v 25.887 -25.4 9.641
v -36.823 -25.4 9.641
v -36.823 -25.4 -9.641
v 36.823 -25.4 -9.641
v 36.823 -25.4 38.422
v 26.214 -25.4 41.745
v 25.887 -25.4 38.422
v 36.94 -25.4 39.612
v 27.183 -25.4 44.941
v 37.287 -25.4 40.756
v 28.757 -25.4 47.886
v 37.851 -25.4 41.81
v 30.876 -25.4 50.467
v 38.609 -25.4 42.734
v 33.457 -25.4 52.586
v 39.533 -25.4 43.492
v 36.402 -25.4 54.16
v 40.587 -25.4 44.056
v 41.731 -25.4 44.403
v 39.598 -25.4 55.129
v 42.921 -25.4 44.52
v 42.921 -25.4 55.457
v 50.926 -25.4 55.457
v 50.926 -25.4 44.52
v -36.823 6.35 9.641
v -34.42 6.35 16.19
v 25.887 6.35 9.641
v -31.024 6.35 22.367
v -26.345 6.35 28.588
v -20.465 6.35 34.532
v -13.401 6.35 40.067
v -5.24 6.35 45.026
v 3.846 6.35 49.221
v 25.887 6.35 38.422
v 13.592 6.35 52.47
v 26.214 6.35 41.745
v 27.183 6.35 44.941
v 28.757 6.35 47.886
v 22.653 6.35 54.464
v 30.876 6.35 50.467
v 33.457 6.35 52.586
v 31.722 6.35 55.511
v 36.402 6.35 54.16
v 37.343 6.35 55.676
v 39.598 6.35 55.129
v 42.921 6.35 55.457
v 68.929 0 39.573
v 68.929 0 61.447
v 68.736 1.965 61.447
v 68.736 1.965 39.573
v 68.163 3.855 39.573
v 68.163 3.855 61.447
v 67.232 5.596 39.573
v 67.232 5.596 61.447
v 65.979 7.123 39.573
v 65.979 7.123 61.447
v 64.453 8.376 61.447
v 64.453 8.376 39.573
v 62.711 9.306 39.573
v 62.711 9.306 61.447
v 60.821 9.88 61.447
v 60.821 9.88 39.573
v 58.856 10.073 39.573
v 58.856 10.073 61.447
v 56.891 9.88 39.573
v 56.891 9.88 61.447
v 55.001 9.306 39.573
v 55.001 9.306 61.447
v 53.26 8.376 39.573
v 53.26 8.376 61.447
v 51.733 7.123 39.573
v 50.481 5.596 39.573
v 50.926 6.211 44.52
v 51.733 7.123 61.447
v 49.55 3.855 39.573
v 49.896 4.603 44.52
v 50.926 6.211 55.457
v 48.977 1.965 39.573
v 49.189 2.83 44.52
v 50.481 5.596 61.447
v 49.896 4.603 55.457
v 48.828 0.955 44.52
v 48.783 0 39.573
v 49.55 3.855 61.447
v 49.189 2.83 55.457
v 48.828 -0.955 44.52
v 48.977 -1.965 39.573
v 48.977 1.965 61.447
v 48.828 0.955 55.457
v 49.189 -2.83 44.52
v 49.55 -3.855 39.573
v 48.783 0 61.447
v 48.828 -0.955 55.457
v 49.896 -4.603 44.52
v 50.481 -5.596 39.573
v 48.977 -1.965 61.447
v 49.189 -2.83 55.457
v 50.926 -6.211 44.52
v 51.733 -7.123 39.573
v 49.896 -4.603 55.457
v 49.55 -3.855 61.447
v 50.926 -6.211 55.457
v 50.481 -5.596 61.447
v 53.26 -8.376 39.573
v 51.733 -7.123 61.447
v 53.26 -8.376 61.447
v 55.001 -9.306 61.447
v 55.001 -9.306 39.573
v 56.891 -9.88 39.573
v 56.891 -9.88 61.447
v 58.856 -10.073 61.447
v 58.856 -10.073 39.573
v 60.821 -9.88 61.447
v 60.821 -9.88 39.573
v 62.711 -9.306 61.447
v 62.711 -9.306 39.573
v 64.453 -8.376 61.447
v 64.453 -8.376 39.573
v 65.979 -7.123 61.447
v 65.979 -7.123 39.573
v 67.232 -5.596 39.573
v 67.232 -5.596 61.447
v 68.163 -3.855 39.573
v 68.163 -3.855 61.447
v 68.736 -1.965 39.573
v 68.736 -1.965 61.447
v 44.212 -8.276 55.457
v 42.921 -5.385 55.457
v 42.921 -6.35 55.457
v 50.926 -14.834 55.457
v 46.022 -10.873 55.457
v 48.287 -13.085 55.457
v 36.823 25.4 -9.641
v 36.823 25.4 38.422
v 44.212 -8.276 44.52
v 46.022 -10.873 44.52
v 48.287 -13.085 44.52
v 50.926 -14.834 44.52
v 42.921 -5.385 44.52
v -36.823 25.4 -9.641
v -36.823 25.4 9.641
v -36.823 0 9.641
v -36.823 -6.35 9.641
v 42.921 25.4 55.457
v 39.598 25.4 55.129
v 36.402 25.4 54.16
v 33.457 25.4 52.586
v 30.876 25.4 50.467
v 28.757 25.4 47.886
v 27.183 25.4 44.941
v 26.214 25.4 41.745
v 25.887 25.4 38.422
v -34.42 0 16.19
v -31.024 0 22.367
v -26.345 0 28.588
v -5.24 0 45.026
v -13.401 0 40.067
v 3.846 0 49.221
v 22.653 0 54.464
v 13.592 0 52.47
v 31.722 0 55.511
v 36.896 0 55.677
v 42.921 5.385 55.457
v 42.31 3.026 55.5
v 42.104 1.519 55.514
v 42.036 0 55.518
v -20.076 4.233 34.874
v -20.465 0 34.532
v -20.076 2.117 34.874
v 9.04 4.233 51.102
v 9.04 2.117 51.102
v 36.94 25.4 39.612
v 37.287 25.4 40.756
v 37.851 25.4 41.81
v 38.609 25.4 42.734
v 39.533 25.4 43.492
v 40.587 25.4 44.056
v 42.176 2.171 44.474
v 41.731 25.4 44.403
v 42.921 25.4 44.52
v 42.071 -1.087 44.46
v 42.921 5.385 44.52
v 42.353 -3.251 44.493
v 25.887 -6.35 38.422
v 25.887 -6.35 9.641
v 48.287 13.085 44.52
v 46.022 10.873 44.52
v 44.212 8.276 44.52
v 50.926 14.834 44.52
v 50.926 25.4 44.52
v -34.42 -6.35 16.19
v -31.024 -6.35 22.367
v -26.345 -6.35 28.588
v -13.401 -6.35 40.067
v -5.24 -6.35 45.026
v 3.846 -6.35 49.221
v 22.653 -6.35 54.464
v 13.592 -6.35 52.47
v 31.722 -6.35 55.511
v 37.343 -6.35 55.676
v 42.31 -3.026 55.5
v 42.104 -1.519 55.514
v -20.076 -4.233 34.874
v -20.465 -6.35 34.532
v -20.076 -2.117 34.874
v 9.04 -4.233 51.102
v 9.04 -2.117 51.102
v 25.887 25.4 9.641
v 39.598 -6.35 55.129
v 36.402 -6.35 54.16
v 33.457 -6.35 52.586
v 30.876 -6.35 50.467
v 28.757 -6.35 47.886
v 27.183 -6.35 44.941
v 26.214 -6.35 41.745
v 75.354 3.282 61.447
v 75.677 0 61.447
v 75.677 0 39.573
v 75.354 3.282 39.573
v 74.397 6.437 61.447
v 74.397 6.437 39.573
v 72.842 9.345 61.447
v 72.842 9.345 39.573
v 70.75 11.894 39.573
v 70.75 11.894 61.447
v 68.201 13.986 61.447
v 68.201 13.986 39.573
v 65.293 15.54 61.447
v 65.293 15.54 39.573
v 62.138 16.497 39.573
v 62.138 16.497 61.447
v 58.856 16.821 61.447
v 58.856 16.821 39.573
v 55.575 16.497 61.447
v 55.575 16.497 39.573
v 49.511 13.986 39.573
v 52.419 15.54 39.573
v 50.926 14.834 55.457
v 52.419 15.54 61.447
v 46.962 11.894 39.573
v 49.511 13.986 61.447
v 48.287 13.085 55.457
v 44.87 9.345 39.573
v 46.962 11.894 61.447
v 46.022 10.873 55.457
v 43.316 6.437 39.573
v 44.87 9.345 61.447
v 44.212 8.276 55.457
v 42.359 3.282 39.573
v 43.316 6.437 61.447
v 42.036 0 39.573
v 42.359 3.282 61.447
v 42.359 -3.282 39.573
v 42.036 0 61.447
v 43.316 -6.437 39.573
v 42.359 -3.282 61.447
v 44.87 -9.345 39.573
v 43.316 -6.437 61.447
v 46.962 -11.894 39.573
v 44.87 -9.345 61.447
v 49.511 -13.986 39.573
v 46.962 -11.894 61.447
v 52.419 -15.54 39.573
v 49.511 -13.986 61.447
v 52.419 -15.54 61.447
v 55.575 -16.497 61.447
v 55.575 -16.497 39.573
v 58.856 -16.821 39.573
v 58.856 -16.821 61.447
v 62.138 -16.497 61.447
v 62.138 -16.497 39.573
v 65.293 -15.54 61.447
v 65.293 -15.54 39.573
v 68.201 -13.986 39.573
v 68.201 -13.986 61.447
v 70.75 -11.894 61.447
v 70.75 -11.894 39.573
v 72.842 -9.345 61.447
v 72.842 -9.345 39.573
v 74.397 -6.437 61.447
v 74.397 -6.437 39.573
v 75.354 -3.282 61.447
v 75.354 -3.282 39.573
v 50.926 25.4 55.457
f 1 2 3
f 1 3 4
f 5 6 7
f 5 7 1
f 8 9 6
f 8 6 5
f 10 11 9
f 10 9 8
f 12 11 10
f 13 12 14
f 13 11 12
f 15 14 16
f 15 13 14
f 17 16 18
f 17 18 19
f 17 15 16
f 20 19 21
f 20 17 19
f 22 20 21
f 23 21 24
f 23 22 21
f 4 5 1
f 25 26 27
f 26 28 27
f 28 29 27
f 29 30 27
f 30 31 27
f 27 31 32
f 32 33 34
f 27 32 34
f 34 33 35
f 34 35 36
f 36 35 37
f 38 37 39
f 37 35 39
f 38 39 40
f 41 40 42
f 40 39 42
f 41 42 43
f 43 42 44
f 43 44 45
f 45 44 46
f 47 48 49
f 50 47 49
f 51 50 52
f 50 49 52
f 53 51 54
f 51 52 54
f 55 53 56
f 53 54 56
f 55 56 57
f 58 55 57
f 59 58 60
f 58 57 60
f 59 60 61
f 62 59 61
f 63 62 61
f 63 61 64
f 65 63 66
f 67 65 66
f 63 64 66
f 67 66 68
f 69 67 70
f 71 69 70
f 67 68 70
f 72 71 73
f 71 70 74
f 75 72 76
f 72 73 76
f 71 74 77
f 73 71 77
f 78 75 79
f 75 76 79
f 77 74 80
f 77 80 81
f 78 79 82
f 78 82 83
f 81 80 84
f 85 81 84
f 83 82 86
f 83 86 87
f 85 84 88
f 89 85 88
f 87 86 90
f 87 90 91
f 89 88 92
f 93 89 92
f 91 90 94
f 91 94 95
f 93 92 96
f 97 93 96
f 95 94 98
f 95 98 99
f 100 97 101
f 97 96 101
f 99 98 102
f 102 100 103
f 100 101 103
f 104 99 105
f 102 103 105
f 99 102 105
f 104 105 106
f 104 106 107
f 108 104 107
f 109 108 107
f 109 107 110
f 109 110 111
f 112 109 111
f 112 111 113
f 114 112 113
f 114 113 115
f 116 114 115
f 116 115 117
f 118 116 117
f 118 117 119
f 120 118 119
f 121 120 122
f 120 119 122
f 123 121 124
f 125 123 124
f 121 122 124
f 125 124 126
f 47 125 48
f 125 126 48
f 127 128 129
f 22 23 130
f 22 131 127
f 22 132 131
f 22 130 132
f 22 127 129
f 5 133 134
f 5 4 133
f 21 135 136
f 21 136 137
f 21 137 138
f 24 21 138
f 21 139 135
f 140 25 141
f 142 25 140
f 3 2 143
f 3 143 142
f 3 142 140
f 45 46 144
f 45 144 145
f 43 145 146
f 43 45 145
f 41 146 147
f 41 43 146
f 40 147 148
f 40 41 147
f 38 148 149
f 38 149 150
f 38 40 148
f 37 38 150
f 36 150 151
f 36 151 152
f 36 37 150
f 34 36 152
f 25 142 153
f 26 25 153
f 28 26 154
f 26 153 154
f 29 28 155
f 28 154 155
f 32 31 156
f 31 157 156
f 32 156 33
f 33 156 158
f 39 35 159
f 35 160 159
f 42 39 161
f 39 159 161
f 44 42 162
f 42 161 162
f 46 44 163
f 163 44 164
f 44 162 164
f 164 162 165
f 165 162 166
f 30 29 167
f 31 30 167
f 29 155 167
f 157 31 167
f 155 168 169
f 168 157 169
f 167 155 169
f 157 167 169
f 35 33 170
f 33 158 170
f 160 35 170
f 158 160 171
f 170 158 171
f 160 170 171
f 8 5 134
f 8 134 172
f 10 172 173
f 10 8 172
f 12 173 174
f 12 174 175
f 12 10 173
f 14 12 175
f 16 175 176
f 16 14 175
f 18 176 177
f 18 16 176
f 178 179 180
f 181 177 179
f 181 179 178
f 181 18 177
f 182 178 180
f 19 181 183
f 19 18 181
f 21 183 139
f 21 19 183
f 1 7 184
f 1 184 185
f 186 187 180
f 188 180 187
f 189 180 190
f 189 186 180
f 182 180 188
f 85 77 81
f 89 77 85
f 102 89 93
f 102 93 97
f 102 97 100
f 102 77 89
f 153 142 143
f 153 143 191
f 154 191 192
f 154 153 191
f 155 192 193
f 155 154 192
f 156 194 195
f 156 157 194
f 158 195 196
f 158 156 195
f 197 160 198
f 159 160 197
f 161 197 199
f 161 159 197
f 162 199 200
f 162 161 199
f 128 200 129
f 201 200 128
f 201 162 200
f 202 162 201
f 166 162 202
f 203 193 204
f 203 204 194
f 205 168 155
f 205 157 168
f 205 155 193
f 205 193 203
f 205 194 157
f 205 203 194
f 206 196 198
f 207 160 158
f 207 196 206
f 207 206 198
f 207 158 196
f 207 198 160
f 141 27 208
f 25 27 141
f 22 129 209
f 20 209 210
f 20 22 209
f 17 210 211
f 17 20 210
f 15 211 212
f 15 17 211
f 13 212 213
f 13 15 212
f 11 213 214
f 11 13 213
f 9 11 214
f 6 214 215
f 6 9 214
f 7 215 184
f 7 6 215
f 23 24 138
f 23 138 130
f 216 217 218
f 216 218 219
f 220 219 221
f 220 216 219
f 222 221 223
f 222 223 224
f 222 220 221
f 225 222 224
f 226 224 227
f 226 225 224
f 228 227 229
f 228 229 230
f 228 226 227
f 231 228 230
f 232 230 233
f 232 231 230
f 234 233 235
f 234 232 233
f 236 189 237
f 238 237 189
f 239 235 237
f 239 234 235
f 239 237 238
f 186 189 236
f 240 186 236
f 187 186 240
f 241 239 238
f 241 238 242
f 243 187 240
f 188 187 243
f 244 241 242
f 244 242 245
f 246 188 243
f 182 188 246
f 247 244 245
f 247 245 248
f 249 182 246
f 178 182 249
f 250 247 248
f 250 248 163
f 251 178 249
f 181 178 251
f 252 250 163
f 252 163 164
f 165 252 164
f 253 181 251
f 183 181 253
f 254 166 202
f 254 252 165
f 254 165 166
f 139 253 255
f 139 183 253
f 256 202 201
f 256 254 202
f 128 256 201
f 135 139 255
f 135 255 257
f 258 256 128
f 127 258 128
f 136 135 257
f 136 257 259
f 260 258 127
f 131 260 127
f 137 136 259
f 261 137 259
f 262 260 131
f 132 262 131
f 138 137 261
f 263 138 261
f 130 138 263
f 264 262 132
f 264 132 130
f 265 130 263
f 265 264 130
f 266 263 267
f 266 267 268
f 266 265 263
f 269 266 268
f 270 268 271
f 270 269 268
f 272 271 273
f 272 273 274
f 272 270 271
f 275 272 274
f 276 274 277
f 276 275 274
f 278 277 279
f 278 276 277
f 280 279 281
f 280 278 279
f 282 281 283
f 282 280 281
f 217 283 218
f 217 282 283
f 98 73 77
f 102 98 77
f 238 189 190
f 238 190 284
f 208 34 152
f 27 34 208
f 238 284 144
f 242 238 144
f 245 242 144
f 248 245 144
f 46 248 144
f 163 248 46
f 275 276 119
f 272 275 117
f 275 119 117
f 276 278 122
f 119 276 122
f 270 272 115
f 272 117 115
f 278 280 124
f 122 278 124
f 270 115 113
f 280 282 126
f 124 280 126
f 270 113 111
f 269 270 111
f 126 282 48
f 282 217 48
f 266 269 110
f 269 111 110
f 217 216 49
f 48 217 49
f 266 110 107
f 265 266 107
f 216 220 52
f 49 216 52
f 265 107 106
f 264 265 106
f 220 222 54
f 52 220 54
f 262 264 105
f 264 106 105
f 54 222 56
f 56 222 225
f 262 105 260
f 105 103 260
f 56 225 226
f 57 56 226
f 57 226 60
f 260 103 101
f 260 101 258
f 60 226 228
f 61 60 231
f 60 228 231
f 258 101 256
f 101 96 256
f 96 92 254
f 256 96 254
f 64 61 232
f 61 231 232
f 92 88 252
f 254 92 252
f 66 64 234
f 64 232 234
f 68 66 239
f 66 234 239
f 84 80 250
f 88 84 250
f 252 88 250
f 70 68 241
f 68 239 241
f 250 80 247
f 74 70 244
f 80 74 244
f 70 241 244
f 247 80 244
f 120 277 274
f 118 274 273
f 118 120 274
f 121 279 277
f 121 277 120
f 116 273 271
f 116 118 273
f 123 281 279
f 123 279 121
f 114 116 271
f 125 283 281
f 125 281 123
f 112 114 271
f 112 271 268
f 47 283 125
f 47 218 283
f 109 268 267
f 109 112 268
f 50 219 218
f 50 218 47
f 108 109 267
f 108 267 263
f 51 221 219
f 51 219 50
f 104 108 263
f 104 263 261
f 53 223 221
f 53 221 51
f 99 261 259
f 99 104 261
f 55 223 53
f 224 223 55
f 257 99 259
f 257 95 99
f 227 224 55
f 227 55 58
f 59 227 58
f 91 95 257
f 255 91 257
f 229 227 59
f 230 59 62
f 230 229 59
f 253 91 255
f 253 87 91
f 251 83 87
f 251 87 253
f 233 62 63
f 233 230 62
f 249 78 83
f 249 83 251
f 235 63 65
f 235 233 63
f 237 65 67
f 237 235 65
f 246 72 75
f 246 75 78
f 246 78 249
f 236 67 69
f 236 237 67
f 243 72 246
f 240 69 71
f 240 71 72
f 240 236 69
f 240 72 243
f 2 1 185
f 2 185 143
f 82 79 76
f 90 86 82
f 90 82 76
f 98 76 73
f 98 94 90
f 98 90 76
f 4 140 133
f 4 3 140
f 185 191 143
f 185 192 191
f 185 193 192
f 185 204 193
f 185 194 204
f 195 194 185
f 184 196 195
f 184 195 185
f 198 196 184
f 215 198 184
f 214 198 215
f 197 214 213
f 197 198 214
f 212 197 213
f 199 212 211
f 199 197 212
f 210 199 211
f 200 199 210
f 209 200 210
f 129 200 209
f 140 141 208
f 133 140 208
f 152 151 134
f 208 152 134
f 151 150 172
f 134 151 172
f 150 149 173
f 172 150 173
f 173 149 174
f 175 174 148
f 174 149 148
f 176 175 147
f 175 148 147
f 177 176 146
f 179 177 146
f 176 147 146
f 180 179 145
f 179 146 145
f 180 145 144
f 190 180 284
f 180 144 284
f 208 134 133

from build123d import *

# Parameters (mm, degrees)
F1_DEPTH = 25.4
F2_DEPTH = 6.35
F3_DEPTH = 25.4
F0_W     = 6.747447
F0_H     = 21.873236


with BuildPart() as f1:
    # F0 (on Front) → F1 (new body, symmetric)
    with BuildSketch(Plane.XZ):
        Polygon((36.823142, -9.641493), (36.823142, 9.641493), (25.886526, 9.641493), (-36.823142, 9.641493), (-36.823142, -9.641493), align=None)
    extrude(amount=F1_DEPTH, both=True)

    # F0 (on Front) → F2 (join, symmetric)
    with BuildSketch(Plane.XZ):
        with BuildLine():
            Line((-36.823142, 9.641493), (25.886526, 9.641493))
            Line((25.886526, 9.641493), (25.886526, 38.422067))
            ThreePointArc((25.886526, 38.422067), (30.875817, 50.467279), (42.921029, 55.456569))
            add(Edge.make_bspline(
                [(-36.823142, 9.641493), (-28.796567, 38.422067), (9.193794, 57.992861), (42.921029, 55.456569)],
                knots=[0, 0, 0, 0, 91.968223, 91.968223, 91.968223, 91.968223], degree=3))
        make_face()
    extrude(amount=F2_DEPTH, both=True)

    # F0 (on Front) → F3 (join, symmetric)
    with BuildSketch(Plane.XZ):
        with BuildLine():
            Line((25.886526, 9.641493), (36.823142, 9.641493))
            Line((36.823142, 9.641493), (36.823142, 38.422067))
            ThreePointArc((36.823142, 38.422067), (38.609172, 42.733923), (42.921029, 44.519953))
            Line((42.921029, 44.519953), (50.925627, 44.519953))
            Line((50.925627, 44.519953), (50.925627, 55.456569))
            Line((50.925627, 55.456569), (42.921029, 55.456569))
            ThreePointArc((42.921029, 55.456569), (30.875817, 50.467279), (25.886526, 38.422067))
            Line((25.886526, 38.422067), (25.886526, 9.641493))
        make_face()
    extrude(amount=F3_DEPTH, both=True)

    # F0 (on Front) → F4 (revolve)
    with BuildSketch(Plane.XZ):
        with Locations((72.303209, 50.509911)):
            Rectangle(F0_W, F0_H)
    revolve(axis=Axis((58.856271, 0, 50.509911), (0, 0, 1)))


solid = f1.part
